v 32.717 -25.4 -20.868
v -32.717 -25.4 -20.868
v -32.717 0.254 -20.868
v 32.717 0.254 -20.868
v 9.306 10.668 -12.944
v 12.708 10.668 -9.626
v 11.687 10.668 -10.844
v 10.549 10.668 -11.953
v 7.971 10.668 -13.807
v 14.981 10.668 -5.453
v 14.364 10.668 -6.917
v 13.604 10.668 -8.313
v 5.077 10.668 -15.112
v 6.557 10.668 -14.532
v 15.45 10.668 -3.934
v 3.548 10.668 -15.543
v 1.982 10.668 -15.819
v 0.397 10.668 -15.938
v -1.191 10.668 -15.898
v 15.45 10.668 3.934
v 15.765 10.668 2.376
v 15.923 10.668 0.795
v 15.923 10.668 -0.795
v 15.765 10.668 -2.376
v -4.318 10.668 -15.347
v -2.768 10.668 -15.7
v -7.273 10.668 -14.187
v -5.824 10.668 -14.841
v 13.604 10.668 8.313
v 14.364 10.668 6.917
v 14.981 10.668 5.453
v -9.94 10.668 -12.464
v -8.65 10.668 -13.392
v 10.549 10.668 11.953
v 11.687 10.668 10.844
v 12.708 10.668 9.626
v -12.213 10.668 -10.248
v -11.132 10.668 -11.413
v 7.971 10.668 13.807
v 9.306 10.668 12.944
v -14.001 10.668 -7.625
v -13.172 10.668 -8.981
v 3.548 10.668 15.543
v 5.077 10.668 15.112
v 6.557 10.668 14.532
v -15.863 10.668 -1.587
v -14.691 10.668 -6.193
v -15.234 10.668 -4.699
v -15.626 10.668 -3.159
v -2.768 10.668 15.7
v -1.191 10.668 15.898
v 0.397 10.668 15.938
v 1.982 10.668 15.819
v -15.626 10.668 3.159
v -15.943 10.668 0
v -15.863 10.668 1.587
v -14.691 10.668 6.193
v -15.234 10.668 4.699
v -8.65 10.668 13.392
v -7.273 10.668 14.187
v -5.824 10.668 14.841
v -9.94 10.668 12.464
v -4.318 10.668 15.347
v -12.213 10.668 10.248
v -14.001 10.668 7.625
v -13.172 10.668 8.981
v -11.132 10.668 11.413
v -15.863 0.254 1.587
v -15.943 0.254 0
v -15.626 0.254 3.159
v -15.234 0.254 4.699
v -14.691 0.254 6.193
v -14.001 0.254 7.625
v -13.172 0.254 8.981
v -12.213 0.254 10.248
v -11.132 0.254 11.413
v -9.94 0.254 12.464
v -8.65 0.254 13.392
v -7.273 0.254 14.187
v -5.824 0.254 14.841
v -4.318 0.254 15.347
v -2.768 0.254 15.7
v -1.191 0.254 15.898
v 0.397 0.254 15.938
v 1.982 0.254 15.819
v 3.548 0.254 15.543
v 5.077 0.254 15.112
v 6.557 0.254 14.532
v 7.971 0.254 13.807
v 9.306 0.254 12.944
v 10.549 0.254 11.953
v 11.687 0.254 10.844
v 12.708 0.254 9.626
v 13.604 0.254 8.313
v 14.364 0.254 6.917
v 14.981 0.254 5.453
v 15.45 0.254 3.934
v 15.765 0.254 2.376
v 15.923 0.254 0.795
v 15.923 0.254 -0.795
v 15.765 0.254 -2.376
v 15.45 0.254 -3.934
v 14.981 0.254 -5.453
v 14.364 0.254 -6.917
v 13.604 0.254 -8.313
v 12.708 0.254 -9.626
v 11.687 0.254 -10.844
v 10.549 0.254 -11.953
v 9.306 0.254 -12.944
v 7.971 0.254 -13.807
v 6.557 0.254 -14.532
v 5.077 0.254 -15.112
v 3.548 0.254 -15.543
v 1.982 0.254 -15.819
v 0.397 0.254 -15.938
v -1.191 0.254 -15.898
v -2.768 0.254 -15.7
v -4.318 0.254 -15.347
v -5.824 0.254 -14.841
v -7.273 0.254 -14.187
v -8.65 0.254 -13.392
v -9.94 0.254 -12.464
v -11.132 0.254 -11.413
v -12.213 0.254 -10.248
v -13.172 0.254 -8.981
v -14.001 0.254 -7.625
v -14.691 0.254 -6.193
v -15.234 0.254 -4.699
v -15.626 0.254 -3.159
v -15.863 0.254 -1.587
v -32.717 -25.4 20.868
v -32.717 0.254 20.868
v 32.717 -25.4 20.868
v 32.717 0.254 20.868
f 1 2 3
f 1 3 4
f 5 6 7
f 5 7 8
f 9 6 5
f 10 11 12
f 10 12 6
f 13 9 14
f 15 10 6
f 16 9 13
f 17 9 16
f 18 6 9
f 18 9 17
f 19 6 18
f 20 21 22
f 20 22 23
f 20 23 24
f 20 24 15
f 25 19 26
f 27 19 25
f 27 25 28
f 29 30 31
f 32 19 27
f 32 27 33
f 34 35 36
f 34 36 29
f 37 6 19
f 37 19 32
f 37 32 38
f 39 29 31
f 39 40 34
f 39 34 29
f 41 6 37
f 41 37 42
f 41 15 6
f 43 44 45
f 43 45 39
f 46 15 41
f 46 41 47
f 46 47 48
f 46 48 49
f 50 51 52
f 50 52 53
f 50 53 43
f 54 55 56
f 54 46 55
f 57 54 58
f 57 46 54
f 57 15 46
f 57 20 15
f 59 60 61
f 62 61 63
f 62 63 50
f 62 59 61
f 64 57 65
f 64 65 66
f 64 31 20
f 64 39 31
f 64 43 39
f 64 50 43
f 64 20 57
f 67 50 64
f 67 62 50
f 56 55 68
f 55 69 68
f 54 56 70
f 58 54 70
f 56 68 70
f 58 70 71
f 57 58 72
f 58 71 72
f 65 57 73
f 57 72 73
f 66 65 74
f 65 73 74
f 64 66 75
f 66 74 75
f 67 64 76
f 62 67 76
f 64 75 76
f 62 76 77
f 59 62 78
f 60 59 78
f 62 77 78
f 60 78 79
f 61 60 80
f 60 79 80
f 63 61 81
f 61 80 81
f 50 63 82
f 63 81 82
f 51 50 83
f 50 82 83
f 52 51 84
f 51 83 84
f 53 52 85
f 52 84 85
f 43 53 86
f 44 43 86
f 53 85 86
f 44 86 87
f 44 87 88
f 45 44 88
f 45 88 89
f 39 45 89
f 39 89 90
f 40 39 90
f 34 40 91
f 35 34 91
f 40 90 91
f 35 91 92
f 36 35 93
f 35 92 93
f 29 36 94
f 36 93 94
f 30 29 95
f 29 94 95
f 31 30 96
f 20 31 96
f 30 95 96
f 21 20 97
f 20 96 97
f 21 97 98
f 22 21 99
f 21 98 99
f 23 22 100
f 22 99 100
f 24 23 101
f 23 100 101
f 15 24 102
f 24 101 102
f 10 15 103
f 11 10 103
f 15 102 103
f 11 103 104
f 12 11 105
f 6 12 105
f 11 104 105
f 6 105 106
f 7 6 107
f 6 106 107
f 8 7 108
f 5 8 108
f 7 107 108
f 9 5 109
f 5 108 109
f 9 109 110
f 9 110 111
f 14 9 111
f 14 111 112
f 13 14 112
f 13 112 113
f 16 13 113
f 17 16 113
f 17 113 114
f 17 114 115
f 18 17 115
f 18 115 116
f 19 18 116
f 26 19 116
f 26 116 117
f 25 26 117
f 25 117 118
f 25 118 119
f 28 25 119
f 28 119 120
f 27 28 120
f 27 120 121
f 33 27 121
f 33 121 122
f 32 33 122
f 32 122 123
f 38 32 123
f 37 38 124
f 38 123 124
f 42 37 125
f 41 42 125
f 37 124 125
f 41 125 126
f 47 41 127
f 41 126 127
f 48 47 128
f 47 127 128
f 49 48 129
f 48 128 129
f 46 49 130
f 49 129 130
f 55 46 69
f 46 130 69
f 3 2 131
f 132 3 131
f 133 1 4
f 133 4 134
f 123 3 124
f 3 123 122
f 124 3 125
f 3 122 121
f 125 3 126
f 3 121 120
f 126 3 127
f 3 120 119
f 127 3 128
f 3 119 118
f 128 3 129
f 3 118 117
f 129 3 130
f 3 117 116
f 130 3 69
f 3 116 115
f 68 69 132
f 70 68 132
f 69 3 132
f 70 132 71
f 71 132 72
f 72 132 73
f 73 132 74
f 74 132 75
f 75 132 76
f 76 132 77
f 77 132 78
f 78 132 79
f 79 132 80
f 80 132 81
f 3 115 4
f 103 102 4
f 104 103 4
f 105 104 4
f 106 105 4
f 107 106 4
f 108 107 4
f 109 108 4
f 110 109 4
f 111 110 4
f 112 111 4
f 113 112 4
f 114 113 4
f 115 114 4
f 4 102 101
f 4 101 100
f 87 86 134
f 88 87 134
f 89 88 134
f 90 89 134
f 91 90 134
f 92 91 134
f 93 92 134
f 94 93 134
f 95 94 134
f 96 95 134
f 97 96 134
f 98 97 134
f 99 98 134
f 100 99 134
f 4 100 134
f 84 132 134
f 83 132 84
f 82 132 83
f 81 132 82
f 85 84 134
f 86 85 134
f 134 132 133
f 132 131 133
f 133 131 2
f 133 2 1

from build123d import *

# Parameters (mm, degrees)
F0_W     = 65.434128046
F0_H     = 41.7352281511
F1_DEPTH = 25.4
F2_R     = 15.9425701821
F3_DEPTH = 7.366
F4_DEPTH = 0.254
F5_DEPTH = 3.302


with BuildPart() as f1:
    # F0 (on Front) → F1 (new body)
    with BuildSketch(Plane.XZ):
        Rectangle(F0_W, F0_H)
    extrude(amount=F1_DEPTH)

    # F2 (on face) → F3 (join)
    with BuildSketch(Plane(origin=(0, 0, 0), x_dir=(-1, 0, 0), z_dir=(0, 1, 0))):
        Circle(F2_R)
    extrude(amount=F3_DEPTH)

    # F4 (add): a face of the model
    f4_faces = [f1.faces().sort_by_distance(p)[0] for p in [
        (31.9409548566, 0, 0),
    ]]
    extrude(f4_faces, amount=F4_DEPTH)

    # F5 (add): a face of the model
    f5_faces = [f1.faces().sort_by_distance(p)[0] for p in [
        (0, 7.366, 0),
    ]]
    extrude(f5_faces, amount=F5_DEPTH)


solid = f1.part
